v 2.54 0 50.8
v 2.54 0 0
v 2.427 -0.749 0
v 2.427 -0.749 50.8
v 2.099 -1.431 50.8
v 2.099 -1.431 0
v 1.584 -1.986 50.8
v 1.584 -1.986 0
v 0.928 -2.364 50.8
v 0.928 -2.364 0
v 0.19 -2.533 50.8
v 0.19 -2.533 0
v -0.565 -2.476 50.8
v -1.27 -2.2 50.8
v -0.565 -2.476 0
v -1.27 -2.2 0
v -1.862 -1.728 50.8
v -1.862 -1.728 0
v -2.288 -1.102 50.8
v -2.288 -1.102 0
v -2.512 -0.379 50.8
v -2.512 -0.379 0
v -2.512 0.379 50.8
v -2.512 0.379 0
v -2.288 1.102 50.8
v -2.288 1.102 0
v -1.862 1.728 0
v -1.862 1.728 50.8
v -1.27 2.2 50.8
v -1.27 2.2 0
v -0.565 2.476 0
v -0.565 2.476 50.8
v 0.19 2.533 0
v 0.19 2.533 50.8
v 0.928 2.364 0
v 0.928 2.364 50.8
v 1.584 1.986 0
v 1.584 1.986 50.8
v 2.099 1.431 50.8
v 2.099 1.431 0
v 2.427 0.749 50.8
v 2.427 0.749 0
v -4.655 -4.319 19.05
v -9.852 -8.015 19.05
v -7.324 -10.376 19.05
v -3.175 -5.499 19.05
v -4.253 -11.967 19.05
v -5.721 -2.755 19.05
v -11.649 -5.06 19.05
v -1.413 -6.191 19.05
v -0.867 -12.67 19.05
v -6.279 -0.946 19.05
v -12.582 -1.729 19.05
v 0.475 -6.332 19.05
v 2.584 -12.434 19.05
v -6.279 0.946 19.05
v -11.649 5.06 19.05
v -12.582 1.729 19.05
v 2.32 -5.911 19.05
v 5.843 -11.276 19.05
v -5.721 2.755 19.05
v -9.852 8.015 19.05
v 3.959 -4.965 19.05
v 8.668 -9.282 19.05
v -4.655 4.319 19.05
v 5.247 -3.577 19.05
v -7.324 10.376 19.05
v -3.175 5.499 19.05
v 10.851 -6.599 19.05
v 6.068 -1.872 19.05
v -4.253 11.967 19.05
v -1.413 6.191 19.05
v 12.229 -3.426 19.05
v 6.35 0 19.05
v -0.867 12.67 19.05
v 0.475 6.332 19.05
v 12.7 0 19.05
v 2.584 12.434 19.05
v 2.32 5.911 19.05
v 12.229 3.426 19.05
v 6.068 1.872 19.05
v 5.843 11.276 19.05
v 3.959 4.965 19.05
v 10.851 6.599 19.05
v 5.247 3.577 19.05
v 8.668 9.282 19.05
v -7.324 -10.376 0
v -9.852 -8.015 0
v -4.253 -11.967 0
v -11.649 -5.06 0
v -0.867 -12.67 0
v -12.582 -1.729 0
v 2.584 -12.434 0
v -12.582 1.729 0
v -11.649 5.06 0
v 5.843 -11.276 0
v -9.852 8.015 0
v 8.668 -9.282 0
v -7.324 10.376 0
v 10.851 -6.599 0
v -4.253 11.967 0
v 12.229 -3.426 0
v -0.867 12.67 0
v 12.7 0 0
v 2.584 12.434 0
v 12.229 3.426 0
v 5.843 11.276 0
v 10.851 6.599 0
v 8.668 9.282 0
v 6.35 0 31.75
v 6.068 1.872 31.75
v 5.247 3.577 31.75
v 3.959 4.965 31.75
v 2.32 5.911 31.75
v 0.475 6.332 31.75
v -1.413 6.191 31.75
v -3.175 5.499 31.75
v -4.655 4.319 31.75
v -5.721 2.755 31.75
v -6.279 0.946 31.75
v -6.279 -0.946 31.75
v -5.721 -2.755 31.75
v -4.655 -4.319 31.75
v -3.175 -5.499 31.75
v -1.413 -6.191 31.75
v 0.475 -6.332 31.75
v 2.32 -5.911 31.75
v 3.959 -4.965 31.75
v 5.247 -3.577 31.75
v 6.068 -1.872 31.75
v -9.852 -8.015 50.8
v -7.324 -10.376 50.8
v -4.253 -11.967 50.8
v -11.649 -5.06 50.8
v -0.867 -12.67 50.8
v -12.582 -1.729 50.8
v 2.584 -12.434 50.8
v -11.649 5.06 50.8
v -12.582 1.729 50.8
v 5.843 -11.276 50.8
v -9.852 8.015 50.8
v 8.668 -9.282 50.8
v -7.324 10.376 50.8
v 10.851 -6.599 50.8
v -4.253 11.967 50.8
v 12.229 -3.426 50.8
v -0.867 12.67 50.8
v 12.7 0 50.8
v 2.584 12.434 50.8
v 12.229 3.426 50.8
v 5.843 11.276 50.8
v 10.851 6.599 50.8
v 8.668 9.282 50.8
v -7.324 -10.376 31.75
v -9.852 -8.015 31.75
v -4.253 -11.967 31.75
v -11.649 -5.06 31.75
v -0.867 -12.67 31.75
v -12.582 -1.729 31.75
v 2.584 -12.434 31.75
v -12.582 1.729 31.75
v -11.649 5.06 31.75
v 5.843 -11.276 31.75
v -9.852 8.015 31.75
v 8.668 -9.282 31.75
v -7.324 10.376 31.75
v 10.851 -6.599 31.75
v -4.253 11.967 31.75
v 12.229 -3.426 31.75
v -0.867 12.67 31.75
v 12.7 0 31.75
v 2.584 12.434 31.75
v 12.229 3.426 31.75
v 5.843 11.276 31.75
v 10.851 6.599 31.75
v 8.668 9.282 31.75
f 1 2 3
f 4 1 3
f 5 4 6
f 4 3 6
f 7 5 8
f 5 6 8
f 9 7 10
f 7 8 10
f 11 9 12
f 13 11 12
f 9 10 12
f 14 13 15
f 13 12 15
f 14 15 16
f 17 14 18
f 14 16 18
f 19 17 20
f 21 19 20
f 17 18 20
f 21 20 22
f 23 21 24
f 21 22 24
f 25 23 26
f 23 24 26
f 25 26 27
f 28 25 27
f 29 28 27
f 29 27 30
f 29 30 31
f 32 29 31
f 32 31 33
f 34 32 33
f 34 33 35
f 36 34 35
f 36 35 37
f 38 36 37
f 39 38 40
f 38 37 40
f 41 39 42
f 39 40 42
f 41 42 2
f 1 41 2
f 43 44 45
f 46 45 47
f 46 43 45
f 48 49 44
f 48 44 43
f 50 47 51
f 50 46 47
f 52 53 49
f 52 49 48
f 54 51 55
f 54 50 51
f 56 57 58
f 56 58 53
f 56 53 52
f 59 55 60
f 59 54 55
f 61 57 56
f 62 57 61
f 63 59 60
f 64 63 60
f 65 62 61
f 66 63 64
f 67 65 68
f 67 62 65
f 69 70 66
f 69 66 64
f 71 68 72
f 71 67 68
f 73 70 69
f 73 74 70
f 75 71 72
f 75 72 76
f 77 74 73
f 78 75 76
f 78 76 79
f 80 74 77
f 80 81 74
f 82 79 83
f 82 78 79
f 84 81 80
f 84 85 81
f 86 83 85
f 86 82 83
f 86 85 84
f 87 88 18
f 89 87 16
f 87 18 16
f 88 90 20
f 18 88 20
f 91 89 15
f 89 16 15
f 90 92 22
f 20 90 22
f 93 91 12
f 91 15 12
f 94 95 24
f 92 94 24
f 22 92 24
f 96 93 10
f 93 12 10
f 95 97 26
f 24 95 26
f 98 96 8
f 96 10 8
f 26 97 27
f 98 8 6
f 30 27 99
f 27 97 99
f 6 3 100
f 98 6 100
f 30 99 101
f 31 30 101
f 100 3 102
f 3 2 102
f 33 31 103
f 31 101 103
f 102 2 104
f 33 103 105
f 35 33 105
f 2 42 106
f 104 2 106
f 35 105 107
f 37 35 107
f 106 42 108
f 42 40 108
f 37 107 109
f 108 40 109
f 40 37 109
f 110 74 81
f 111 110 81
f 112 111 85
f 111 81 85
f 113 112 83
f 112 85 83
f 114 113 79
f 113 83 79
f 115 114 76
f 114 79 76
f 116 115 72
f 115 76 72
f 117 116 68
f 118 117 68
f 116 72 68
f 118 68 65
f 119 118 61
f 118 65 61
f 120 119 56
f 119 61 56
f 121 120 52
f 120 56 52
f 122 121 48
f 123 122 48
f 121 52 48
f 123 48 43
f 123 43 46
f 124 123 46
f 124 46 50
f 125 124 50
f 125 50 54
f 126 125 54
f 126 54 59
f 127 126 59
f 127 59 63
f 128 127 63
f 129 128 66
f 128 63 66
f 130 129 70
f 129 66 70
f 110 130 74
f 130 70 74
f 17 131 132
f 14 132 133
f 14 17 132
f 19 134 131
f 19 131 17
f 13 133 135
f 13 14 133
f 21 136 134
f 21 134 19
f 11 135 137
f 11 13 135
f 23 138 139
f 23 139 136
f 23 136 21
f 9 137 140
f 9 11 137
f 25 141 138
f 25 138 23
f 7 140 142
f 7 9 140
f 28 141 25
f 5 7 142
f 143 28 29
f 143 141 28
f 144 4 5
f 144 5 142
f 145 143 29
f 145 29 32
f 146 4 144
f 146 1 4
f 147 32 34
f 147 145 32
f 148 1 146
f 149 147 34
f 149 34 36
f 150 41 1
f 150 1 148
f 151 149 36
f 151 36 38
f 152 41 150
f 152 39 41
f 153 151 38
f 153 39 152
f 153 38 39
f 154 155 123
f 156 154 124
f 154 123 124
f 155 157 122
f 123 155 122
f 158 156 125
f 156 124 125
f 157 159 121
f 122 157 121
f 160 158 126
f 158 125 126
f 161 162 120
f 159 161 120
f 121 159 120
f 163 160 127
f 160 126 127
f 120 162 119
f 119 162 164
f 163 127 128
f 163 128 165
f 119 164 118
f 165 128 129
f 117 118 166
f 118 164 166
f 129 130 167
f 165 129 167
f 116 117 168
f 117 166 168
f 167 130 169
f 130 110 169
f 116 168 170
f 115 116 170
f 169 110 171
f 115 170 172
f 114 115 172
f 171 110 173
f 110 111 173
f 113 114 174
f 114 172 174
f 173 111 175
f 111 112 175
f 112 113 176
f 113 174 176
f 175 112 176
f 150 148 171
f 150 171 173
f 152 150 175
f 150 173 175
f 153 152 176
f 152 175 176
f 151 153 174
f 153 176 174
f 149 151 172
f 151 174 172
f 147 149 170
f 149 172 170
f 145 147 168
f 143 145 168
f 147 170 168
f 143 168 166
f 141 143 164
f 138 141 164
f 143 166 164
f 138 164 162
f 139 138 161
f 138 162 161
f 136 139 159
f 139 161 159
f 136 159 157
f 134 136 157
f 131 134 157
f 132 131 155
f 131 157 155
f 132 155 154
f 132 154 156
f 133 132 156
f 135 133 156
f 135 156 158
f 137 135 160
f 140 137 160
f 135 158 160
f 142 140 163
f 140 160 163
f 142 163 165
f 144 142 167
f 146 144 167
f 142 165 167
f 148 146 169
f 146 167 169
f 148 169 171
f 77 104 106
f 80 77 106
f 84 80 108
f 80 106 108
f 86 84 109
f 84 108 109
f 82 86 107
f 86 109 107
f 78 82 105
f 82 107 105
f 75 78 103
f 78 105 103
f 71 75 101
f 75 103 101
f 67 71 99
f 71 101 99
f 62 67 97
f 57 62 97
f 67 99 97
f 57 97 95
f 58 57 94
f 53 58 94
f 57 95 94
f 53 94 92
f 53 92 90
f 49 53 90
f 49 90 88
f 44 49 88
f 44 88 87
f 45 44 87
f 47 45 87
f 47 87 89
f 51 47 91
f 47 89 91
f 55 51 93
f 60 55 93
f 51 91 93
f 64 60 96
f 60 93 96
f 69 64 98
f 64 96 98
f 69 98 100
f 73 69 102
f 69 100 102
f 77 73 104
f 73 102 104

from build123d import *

# Parameters (mm, degrees)
F0_R     = 12.7
F1_DEPTH = 19.05
F2_R     = 6.35
F3_DEPTH = 12.7
F4_R     = 12.7
F5_DEPTH = 19.05
F6_R     = 2.54
F7_DEPTH = 50.8


with BuildPart() as f1:
    # F0 (on Top) → F1 (new body)
    with BuildSketch(Plane.XY):
        Circle(F0_R)
    extrude(amount=F1_DEPTH)

    # F2 (on face) → F3 (join)
    with BuildSketch(Plane.XY.offset(19.05)):
        Circle(F2_R)
    extrude(amount=F3_DEPTH)

    # F4 (on face) → F5 (join)
    with BuildSketch(Plane.XY.offset(31.75)):
        Circle(F4_R)
    extrude(amount=F5_DEPTH)

    # F6 (on face) → F7 (cut)
    with BuildSketch(Plane(origin=(0, 0, 0), x_dir=(1, 0, 0), z_dir=(0, 0, -1))):
        Circle(F6_R)
    extrude(amount=-F7_DEPTH, mode=Mode.SUBTRACT)


solid = f1.part
